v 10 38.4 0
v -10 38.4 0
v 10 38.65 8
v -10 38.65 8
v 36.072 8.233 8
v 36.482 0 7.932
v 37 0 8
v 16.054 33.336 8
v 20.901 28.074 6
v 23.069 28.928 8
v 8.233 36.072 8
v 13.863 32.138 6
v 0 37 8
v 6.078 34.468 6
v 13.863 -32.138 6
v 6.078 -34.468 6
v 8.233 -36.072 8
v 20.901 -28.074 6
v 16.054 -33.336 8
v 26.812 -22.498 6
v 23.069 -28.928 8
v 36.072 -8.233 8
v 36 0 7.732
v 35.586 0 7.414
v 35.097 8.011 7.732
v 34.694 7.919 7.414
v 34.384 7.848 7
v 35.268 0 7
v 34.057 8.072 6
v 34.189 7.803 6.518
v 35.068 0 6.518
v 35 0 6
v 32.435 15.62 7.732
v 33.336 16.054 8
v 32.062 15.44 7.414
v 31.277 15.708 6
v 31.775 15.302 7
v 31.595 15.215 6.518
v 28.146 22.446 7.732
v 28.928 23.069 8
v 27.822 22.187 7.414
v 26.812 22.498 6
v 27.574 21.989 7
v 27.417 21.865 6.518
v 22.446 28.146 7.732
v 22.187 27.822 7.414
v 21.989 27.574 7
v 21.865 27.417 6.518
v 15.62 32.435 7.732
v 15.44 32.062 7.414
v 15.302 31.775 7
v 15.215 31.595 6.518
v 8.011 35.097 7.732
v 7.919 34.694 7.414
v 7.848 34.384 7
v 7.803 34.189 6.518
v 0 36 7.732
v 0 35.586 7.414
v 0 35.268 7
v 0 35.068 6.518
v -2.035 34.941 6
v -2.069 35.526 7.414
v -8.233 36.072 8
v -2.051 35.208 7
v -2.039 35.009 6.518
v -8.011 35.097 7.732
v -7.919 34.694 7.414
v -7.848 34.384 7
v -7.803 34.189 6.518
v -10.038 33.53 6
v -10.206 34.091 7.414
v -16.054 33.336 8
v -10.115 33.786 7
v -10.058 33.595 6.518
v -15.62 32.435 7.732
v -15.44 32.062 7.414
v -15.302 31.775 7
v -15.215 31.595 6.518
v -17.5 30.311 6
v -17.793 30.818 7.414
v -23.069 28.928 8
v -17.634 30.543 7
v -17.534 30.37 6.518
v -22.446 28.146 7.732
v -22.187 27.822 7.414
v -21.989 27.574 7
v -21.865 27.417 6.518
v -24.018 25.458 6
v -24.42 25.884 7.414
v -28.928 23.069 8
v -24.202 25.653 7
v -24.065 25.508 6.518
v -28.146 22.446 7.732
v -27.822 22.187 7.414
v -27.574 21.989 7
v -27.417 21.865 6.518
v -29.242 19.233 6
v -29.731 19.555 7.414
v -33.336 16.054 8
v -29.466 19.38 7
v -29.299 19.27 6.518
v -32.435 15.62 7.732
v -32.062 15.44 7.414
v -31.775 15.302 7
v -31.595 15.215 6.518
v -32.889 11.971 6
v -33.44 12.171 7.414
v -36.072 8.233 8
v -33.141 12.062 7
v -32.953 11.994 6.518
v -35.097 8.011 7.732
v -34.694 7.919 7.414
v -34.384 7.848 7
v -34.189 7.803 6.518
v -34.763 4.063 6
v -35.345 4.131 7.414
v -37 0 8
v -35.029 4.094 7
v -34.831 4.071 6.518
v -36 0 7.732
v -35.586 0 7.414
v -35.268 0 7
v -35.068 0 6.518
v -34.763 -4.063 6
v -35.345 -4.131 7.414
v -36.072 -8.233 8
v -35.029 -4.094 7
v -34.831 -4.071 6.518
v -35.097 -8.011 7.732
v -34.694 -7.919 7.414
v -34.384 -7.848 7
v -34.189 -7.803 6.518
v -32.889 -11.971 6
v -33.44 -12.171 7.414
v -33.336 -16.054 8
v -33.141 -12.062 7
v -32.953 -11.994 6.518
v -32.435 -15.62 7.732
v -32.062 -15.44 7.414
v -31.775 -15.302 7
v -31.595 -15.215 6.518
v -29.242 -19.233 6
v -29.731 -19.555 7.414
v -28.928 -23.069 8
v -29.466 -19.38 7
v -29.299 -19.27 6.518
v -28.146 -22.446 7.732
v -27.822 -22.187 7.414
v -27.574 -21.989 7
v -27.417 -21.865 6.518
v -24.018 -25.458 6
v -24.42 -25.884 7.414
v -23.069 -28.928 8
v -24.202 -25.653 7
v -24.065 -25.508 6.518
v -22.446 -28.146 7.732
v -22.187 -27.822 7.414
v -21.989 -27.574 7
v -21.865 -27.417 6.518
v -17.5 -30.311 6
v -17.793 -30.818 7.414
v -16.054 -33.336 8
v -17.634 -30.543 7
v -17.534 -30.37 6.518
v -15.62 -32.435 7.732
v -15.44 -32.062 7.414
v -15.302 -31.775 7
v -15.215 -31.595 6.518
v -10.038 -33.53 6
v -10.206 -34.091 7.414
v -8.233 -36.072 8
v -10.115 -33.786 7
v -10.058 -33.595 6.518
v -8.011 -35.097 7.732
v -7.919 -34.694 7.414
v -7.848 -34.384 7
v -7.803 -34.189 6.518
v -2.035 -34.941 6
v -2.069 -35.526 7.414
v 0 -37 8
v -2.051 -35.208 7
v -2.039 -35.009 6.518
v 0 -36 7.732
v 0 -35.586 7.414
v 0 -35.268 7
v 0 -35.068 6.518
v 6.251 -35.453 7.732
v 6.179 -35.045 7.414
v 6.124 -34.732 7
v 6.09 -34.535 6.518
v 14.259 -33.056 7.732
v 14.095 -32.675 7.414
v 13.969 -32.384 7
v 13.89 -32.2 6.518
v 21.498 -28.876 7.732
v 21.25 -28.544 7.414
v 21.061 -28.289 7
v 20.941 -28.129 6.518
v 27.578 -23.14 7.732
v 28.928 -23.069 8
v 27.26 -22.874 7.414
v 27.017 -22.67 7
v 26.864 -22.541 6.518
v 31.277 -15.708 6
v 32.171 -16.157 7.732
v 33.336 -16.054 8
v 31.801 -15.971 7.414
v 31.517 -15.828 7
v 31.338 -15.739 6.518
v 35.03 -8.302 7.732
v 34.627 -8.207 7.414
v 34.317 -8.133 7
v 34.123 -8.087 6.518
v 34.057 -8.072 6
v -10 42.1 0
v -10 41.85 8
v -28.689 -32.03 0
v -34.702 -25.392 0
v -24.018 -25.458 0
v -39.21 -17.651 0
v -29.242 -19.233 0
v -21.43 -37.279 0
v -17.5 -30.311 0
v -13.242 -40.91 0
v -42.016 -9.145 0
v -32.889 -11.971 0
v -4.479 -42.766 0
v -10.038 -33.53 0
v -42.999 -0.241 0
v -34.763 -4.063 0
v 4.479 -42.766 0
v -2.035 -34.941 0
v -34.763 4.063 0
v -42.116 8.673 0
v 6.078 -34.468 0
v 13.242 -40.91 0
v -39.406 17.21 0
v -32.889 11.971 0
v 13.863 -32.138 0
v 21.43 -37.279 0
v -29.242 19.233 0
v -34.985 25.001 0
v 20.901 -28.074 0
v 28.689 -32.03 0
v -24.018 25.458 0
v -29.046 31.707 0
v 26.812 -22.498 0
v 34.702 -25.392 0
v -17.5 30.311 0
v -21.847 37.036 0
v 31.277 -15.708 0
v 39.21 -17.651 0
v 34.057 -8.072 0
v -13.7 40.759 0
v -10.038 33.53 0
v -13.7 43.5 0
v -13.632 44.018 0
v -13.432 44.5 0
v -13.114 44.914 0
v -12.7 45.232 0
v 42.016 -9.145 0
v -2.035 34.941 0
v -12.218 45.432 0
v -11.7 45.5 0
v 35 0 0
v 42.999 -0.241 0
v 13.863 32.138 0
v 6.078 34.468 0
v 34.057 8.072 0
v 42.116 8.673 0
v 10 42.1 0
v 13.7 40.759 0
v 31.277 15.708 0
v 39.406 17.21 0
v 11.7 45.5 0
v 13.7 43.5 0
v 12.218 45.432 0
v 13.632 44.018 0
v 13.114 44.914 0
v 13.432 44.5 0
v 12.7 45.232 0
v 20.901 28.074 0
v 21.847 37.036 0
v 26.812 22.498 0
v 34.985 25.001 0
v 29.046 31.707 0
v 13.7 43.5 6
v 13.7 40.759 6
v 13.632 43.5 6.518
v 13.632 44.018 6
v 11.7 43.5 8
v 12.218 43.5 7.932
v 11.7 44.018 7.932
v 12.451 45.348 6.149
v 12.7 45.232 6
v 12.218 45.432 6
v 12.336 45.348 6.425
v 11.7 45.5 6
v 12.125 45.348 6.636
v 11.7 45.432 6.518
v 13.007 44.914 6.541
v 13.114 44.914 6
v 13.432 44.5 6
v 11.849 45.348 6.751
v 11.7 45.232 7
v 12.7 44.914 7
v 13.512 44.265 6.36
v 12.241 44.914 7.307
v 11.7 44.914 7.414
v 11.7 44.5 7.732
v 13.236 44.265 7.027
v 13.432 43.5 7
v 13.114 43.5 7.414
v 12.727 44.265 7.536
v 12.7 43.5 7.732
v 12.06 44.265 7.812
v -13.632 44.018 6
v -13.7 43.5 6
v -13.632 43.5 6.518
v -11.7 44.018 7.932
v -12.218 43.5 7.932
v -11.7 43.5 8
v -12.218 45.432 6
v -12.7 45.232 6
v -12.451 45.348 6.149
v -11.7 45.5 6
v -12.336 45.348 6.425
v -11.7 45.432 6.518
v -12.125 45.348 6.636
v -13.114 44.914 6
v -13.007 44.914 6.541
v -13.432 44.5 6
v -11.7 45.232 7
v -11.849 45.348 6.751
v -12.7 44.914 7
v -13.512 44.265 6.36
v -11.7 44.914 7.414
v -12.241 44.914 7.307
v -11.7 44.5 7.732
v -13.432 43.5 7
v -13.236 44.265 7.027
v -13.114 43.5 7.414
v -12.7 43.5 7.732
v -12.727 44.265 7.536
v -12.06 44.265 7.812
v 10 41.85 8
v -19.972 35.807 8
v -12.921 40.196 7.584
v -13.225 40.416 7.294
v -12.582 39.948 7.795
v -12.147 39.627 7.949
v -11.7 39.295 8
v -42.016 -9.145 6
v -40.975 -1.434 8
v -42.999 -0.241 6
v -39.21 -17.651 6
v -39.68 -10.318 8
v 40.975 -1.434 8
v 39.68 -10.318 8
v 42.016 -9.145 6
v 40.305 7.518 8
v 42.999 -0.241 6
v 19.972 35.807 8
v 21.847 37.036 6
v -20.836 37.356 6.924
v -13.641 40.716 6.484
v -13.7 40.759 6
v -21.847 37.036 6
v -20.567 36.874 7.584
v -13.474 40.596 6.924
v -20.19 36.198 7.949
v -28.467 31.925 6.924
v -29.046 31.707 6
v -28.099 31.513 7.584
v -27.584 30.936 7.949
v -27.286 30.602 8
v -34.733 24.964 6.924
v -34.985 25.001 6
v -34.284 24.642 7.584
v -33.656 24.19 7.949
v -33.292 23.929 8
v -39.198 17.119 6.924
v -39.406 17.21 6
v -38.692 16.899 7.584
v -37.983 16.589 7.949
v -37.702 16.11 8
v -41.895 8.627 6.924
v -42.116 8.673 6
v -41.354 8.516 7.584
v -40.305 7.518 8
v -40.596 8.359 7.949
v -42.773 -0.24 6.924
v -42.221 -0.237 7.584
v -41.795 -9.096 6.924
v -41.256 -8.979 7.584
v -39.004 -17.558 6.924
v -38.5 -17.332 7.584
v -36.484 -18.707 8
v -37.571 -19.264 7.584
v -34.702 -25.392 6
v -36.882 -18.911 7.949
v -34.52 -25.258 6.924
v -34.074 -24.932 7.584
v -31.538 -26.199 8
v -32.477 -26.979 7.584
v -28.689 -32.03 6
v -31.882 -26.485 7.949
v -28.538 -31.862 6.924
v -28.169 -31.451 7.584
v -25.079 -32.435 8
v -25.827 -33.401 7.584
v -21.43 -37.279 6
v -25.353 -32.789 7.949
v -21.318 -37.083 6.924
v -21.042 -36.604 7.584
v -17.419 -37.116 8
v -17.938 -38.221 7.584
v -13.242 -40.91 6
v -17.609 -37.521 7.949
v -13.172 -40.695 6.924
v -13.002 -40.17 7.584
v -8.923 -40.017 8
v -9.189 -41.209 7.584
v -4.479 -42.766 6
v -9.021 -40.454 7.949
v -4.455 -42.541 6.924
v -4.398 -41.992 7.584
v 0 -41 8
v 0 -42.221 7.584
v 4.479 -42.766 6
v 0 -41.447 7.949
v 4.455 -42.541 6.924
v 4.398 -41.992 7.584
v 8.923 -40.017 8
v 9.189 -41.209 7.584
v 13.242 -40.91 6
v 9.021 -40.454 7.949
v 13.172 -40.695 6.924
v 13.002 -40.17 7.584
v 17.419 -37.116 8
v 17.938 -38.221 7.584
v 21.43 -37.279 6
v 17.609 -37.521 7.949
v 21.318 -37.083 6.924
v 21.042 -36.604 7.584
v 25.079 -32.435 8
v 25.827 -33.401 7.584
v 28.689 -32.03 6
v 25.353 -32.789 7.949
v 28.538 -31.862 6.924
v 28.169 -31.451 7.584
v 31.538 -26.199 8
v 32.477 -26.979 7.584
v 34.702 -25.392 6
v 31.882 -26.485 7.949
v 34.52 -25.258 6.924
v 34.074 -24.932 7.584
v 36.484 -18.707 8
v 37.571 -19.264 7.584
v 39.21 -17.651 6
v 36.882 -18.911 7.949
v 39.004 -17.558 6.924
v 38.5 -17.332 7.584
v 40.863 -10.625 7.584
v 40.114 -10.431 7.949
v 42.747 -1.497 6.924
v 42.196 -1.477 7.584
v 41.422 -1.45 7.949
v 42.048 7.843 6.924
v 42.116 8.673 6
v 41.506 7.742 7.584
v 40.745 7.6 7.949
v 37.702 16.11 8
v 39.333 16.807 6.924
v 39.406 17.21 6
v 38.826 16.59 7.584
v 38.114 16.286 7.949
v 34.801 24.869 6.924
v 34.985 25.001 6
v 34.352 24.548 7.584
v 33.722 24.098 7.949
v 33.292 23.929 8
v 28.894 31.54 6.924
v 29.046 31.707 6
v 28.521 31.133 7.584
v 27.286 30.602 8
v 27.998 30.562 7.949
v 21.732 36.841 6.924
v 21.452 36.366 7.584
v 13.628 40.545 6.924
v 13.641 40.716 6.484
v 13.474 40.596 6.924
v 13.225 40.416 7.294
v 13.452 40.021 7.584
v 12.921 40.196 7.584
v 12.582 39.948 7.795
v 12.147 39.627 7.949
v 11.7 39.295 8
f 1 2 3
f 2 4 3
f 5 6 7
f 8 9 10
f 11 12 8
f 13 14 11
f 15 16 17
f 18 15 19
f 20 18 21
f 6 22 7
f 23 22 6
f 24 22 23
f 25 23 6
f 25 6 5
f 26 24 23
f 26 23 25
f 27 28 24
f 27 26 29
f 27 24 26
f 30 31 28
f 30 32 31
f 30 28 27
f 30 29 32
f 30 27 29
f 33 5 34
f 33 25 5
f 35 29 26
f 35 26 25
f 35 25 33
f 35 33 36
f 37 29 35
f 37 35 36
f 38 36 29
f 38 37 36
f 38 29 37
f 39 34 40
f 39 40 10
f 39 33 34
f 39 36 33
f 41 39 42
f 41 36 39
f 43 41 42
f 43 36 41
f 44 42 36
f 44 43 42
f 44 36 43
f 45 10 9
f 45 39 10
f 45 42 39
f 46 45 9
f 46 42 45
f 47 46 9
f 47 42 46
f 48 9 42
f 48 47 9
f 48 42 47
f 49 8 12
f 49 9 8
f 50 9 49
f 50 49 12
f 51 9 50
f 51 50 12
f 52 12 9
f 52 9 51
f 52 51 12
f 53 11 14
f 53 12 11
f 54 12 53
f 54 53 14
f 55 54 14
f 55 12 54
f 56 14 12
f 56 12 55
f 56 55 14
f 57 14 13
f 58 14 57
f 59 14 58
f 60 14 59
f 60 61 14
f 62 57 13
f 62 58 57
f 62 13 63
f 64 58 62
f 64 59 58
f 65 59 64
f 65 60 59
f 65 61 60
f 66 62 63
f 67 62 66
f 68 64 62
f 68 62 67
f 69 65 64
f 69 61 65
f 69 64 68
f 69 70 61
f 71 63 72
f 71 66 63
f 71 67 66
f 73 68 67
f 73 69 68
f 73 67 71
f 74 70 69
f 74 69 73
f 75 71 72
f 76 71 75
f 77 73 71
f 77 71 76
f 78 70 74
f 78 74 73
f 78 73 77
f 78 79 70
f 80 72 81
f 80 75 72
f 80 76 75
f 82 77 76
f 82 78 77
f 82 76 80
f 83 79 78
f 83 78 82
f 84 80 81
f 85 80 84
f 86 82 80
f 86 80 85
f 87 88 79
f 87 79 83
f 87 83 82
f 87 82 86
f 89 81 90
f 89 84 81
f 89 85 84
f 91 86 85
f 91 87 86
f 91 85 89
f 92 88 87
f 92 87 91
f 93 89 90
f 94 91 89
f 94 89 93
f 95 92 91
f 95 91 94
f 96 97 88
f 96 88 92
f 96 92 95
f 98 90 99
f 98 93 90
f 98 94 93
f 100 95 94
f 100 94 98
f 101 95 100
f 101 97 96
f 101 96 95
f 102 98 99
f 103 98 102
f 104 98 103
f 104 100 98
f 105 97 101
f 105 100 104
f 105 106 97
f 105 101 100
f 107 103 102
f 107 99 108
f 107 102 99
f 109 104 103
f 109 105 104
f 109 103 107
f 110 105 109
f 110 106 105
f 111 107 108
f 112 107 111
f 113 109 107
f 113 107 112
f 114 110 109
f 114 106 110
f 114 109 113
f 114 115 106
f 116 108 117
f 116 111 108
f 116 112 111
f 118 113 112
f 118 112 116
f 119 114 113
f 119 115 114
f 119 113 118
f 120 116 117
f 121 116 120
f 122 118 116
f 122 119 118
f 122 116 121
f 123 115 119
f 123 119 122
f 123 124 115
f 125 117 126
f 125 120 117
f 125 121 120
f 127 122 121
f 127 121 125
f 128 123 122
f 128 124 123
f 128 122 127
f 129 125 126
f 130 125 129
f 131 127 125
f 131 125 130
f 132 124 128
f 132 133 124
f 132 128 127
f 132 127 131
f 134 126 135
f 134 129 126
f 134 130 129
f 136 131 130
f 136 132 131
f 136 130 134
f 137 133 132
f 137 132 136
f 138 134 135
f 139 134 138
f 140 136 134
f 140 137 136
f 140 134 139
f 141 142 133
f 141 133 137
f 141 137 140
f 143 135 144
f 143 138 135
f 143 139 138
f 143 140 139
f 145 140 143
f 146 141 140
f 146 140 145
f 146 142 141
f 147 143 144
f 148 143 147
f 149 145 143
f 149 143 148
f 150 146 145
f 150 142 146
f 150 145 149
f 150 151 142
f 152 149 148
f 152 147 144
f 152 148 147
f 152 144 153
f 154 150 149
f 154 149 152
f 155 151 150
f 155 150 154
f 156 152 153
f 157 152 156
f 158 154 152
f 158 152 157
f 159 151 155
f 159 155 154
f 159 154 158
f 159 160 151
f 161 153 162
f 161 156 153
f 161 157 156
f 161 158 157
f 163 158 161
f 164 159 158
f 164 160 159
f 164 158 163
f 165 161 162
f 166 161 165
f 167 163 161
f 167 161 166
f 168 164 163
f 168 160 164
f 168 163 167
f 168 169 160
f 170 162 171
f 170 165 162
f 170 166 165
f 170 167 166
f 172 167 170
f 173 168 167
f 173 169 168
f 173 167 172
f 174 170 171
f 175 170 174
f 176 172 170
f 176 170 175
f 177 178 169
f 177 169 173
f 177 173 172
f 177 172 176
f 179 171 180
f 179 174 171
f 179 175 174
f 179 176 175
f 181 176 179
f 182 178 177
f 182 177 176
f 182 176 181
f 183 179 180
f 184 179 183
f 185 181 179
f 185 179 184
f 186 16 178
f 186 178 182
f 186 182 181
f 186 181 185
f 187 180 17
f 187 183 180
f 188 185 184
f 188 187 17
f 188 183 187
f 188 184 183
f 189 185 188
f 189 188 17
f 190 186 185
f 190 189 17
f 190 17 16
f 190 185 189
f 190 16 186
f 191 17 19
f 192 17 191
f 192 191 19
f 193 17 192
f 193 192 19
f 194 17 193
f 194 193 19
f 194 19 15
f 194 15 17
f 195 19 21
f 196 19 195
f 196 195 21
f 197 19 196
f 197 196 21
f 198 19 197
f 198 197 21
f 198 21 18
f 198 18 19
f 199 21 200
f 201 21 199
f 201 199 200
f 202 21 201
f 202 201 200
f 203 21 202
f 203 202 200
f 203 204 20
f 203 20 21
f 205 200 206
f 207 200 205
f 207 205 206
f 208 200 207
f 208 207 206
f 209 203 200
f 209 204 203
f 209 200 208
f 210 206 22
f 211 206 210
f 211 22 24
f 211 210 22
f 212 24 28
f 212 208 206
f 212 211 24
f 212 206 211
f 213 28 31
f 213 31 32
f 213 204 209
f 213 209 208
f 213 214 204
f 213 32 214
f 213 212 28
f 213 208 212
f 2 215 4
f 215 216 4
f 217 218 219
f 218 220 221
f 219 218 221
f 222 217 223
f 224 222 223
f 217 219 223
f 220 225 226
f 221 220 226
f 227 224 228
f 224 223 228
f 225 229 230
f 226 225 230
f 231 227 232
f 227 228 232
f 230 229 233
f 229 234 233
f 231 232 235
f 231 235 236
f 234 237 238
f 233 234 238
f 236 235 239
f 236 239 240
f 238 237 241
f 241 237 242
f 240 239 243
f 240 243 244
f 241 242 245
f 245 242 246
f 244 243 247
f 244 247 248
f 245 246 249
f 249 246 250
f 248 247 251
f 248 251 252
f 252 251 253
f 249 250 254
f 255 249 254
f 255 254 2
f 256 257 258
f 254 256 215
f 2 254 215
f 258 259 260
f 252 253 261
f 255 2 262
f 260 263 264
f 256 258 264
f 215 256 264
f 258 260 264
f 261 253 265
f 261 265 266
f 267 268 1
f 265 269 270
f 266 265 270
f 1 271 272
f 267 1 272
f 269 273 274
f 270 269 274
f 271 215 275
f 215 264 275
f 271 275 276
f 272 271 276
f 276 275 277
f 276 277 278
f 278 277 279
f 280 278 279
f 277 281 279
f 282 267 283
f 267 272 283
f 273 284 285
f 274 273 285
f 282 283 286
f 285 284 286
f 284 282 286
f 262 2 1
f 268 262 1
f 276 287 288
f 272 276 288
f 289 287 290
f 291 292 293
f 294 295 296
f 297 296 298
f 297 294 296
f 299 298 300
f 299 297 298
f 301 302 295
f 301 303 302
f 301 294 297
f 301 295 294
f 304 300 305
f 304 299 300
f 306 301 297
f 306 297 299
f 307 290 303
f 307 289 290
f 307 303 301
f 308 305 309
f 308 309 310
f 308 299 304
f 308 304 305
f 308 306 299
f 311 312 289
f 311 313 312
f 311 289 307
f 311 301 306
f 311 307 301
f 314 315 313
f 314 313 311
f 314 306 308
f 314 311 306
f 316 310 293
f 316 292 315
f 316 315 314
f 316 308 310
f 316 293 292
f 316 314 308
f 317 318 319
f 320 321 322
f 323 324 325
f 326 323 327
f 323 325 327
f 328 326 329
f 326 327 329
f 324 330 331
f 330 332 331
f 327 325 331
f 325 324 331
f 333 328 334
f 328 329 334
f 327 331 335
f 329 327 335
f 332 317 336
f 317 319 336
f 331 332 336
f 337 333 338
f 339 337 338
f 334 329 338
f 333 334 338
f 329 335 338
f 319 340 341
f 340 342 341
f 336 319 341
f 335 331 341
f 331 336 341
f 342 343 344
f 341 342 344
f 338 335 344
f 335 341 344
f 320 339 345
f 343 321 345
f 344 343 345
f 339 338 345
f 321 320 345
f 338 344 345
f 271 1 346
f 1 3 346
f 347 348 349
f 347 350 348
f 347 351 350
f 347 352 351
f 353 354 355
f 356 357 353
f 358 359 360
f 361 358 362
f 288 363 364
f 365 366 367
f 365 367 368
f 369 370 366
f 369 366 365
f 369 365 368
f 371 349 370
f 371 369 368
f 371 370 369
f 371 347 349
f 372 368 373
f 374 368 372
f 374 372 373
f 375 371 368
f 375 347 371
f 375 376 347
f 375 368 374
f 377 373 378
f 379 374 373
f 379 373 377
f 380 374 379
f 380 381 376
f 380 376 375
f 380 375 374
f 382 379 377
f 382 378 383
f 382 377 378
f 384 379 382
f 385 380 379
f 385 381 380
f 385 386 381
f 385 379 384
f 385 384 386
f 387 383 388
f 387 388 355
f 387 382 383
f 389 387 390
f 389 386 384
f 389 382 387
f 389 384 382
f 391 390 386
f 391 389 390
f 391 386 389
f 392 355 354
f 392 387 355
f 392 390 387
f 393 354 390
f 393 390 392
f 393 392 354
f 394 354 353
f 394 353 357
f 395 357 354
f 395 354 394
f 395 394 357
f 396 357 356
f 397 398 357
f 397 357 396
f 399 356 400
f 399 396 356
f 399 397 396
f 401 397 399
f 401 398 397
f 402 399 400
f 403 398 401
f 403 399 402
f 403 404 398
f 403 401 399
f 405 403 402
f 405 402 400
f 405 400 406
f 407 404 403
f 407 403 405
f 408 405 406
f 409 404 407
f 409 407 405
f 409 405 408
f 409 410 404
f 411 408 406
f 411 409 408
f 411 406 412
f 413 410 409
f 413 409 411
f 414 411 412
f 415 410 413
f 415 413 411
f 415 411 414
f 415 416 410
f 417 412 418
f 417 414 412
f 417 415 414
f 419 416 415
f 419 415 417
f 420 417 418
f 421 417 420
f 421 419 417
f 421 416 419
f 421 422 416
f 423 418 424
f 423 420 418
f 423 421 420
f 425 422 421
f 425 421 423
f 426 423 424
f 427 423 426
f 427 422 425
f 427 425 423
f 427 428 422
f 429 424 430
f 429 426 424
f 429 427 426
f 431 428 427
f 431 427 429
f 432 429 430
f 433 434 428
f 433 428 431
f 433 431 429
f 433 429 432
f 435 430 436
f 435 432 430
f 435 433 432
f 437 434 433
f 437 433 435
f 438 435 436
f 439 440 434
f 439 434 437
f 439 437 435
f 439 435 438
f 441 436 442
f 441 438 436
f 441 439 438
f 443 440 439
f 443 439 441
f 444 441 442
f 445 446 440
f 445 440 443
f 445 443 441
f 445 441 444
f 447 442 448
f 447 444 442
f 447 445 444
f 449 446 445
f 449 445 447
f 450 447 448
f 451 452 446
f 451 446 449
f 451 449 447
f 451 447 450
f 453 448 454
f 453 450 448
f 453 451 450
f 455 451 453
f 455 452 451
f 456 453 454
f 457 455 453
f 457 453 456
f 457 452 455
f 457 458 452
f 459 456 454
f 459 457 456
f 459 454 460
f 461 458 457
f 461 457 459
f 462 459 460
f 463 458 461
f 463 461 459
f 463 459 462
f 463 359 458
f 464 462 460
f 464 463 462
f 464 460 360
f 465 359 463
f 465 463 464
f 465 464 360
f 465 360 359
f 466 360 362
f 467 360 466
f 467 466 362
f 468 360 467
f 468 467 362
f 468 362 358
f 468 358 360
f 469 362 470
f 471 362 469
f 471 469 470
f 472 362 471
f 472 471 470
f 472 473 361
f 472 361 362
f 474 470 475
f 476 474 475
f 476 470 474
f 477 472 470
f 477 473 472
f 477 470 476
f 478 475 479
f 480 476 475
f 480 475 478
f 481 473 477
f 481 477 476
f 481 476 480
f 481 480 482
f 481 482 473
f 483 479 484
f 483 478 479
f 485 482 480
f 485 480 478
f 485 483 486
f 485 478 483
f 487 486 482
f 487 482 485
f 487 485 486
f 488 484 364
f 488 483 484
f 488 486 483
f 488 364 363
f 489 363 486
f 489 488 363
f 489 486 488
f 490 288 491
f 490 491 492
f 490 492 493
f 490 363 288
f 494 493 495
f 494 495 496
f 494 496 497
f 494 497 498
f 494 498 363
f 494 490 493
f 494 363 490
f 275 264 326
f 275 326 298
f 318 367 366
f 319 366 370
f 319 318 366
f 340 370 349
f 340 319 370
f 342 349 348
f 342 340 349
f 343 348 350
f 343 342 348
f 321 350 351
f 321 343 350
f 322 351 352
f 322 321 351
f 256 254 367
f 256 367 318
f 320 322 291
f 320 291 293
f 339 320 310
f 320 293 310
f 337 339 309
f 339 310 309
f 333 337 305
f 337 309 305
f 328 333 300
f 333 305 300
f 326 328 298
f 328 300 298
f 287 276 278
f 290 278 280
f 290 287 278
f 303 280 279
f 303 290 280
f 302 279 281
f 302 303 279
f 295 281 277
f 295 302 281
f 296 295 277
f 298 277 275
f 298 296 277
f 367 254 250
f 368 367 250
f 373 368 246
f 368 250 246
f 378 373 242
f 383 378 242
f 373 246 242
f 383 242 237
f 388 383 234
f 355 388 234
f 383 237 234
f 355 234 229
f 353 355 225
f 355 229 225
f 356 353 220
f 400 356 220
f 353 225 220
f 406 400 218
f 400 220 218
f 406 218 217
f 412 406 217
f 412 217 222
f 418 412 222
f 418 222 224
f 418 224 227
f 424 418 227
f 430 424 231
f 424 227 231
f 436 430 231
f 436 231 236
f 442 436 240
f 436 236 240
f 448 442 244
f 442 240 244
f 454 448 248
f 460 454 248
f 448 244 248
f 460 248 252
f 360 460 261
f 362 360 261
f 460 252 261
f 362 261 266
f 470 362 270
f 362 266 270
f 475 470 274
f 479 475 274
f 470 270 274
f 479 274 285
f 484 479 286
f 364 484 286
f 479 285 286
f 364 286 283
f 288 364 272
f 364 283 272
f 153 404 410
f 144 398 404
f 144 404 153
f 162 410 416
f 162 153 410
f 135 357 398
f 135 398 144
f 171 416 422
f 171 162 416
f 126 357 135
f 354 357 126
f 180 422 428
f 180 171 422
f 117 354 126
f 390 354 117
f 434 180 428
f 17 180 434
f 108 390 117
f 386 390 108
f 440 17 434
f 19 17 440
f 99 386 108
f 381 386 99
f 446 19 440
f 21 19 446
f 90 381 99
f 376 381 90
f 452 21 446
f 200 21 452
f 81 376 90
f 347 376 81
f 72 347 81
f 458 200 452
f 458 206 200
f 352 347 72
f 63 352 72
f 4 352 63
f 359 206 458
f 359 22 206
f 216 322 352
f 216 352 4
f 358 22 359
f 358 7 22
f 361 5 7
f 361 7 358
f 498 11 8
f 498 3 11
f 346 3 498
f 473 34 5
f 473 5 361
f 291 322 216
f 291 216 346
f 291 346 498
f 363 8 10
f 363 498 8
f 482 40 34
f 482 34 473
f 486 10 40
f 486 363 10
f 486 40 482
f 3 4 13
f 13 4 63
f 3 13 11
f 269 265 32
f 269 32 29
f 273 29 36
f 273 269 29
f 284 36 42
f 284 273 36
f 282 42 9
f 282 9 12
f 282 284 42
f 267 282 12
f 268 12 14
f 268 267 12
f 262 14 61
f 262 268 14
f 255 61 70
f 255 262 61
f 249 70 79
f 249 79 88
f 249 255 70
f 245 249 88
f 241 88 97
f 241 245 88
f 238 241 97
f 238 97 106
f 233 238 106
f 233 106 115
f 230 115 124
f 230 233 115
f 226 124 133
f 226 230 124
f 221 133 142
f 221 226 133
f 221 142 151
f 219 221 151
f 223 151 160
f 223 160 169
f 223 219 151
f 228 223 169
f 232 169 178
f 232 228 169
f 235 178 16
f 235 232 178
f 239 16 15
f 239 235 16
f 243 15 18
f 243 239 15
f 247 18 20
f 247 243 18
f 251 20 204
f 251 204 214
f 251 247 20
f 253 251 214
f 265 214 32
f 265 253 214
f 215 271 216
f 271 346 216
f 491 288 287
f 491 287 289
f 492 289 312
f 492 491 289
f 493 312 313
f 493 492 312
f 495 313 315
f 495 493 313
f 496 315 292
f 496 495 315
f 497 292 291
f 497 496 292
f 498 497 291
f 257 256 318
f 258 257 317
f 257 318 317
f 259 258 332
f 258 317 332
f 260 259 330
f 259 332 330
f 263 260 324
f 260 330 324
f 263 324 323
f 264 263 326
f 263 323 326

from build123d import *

# Parameters (mm, degrees)
SKETCH_R    = 35
PAD_DEPTH   = 8
SKETCH001_W = 20
SKETCH001_H = 3.7
SKETCH002_W = 20
SKETCH002_H = 3.2
FILLET_R    = 2


with BuildPart() as part:
    # Sketch → Pad (new body)
    with BuildSketch(Plane.XY):
        with BuildLine():
            ThreePointArc((-13.7, 40.759171), (0, -43), (13.7, 40.759171))
            Line((13.7, 45.5), (13.7, 40.759171))
            Line((-13.7, 45.5), (13.7, 45.5))
            Line((-13.7, 40.759171), (-13.7, 45.5))
        make_face()
        Circle(SKETCH_R, mode=Mode.SUBTRACT)
    extrude(amount=PAD_DEPTH)

    # Sketch001 → SubtractiveLoft section 0
    with BuildSketch(Plane.XY):
        with Locations((0, 40.25)):
            Rectangle(SKETCH001_W, SKETCH001_H)
    # Sketch002 (on Face7 of Pad) → SubtractiveLoft section 1
    with BuildSketch(Plane.XY.offset(8)):
        with Locations((0, 40.25)):
            Rectangle(SKETCH002_W, SKETCH002_H)
    loft(mode=Mode.SUBTRACT)

    # Fillet
    fillet_edges = [part.edges().sort_by_distance(p)[0] for p in [
        (-35, 0, 8),
        (0, -43, 8),
        (-13.7, 43.129585, 8),
        (13.7, 43.129585, 8),
        (-13.7, 45.5, 4),
        (13.7, 45.5, 4),
        (0, 45.5, 8),
    ]]
    fillet(fillet_edges, radius=FILLET_R)


solid = part.part
